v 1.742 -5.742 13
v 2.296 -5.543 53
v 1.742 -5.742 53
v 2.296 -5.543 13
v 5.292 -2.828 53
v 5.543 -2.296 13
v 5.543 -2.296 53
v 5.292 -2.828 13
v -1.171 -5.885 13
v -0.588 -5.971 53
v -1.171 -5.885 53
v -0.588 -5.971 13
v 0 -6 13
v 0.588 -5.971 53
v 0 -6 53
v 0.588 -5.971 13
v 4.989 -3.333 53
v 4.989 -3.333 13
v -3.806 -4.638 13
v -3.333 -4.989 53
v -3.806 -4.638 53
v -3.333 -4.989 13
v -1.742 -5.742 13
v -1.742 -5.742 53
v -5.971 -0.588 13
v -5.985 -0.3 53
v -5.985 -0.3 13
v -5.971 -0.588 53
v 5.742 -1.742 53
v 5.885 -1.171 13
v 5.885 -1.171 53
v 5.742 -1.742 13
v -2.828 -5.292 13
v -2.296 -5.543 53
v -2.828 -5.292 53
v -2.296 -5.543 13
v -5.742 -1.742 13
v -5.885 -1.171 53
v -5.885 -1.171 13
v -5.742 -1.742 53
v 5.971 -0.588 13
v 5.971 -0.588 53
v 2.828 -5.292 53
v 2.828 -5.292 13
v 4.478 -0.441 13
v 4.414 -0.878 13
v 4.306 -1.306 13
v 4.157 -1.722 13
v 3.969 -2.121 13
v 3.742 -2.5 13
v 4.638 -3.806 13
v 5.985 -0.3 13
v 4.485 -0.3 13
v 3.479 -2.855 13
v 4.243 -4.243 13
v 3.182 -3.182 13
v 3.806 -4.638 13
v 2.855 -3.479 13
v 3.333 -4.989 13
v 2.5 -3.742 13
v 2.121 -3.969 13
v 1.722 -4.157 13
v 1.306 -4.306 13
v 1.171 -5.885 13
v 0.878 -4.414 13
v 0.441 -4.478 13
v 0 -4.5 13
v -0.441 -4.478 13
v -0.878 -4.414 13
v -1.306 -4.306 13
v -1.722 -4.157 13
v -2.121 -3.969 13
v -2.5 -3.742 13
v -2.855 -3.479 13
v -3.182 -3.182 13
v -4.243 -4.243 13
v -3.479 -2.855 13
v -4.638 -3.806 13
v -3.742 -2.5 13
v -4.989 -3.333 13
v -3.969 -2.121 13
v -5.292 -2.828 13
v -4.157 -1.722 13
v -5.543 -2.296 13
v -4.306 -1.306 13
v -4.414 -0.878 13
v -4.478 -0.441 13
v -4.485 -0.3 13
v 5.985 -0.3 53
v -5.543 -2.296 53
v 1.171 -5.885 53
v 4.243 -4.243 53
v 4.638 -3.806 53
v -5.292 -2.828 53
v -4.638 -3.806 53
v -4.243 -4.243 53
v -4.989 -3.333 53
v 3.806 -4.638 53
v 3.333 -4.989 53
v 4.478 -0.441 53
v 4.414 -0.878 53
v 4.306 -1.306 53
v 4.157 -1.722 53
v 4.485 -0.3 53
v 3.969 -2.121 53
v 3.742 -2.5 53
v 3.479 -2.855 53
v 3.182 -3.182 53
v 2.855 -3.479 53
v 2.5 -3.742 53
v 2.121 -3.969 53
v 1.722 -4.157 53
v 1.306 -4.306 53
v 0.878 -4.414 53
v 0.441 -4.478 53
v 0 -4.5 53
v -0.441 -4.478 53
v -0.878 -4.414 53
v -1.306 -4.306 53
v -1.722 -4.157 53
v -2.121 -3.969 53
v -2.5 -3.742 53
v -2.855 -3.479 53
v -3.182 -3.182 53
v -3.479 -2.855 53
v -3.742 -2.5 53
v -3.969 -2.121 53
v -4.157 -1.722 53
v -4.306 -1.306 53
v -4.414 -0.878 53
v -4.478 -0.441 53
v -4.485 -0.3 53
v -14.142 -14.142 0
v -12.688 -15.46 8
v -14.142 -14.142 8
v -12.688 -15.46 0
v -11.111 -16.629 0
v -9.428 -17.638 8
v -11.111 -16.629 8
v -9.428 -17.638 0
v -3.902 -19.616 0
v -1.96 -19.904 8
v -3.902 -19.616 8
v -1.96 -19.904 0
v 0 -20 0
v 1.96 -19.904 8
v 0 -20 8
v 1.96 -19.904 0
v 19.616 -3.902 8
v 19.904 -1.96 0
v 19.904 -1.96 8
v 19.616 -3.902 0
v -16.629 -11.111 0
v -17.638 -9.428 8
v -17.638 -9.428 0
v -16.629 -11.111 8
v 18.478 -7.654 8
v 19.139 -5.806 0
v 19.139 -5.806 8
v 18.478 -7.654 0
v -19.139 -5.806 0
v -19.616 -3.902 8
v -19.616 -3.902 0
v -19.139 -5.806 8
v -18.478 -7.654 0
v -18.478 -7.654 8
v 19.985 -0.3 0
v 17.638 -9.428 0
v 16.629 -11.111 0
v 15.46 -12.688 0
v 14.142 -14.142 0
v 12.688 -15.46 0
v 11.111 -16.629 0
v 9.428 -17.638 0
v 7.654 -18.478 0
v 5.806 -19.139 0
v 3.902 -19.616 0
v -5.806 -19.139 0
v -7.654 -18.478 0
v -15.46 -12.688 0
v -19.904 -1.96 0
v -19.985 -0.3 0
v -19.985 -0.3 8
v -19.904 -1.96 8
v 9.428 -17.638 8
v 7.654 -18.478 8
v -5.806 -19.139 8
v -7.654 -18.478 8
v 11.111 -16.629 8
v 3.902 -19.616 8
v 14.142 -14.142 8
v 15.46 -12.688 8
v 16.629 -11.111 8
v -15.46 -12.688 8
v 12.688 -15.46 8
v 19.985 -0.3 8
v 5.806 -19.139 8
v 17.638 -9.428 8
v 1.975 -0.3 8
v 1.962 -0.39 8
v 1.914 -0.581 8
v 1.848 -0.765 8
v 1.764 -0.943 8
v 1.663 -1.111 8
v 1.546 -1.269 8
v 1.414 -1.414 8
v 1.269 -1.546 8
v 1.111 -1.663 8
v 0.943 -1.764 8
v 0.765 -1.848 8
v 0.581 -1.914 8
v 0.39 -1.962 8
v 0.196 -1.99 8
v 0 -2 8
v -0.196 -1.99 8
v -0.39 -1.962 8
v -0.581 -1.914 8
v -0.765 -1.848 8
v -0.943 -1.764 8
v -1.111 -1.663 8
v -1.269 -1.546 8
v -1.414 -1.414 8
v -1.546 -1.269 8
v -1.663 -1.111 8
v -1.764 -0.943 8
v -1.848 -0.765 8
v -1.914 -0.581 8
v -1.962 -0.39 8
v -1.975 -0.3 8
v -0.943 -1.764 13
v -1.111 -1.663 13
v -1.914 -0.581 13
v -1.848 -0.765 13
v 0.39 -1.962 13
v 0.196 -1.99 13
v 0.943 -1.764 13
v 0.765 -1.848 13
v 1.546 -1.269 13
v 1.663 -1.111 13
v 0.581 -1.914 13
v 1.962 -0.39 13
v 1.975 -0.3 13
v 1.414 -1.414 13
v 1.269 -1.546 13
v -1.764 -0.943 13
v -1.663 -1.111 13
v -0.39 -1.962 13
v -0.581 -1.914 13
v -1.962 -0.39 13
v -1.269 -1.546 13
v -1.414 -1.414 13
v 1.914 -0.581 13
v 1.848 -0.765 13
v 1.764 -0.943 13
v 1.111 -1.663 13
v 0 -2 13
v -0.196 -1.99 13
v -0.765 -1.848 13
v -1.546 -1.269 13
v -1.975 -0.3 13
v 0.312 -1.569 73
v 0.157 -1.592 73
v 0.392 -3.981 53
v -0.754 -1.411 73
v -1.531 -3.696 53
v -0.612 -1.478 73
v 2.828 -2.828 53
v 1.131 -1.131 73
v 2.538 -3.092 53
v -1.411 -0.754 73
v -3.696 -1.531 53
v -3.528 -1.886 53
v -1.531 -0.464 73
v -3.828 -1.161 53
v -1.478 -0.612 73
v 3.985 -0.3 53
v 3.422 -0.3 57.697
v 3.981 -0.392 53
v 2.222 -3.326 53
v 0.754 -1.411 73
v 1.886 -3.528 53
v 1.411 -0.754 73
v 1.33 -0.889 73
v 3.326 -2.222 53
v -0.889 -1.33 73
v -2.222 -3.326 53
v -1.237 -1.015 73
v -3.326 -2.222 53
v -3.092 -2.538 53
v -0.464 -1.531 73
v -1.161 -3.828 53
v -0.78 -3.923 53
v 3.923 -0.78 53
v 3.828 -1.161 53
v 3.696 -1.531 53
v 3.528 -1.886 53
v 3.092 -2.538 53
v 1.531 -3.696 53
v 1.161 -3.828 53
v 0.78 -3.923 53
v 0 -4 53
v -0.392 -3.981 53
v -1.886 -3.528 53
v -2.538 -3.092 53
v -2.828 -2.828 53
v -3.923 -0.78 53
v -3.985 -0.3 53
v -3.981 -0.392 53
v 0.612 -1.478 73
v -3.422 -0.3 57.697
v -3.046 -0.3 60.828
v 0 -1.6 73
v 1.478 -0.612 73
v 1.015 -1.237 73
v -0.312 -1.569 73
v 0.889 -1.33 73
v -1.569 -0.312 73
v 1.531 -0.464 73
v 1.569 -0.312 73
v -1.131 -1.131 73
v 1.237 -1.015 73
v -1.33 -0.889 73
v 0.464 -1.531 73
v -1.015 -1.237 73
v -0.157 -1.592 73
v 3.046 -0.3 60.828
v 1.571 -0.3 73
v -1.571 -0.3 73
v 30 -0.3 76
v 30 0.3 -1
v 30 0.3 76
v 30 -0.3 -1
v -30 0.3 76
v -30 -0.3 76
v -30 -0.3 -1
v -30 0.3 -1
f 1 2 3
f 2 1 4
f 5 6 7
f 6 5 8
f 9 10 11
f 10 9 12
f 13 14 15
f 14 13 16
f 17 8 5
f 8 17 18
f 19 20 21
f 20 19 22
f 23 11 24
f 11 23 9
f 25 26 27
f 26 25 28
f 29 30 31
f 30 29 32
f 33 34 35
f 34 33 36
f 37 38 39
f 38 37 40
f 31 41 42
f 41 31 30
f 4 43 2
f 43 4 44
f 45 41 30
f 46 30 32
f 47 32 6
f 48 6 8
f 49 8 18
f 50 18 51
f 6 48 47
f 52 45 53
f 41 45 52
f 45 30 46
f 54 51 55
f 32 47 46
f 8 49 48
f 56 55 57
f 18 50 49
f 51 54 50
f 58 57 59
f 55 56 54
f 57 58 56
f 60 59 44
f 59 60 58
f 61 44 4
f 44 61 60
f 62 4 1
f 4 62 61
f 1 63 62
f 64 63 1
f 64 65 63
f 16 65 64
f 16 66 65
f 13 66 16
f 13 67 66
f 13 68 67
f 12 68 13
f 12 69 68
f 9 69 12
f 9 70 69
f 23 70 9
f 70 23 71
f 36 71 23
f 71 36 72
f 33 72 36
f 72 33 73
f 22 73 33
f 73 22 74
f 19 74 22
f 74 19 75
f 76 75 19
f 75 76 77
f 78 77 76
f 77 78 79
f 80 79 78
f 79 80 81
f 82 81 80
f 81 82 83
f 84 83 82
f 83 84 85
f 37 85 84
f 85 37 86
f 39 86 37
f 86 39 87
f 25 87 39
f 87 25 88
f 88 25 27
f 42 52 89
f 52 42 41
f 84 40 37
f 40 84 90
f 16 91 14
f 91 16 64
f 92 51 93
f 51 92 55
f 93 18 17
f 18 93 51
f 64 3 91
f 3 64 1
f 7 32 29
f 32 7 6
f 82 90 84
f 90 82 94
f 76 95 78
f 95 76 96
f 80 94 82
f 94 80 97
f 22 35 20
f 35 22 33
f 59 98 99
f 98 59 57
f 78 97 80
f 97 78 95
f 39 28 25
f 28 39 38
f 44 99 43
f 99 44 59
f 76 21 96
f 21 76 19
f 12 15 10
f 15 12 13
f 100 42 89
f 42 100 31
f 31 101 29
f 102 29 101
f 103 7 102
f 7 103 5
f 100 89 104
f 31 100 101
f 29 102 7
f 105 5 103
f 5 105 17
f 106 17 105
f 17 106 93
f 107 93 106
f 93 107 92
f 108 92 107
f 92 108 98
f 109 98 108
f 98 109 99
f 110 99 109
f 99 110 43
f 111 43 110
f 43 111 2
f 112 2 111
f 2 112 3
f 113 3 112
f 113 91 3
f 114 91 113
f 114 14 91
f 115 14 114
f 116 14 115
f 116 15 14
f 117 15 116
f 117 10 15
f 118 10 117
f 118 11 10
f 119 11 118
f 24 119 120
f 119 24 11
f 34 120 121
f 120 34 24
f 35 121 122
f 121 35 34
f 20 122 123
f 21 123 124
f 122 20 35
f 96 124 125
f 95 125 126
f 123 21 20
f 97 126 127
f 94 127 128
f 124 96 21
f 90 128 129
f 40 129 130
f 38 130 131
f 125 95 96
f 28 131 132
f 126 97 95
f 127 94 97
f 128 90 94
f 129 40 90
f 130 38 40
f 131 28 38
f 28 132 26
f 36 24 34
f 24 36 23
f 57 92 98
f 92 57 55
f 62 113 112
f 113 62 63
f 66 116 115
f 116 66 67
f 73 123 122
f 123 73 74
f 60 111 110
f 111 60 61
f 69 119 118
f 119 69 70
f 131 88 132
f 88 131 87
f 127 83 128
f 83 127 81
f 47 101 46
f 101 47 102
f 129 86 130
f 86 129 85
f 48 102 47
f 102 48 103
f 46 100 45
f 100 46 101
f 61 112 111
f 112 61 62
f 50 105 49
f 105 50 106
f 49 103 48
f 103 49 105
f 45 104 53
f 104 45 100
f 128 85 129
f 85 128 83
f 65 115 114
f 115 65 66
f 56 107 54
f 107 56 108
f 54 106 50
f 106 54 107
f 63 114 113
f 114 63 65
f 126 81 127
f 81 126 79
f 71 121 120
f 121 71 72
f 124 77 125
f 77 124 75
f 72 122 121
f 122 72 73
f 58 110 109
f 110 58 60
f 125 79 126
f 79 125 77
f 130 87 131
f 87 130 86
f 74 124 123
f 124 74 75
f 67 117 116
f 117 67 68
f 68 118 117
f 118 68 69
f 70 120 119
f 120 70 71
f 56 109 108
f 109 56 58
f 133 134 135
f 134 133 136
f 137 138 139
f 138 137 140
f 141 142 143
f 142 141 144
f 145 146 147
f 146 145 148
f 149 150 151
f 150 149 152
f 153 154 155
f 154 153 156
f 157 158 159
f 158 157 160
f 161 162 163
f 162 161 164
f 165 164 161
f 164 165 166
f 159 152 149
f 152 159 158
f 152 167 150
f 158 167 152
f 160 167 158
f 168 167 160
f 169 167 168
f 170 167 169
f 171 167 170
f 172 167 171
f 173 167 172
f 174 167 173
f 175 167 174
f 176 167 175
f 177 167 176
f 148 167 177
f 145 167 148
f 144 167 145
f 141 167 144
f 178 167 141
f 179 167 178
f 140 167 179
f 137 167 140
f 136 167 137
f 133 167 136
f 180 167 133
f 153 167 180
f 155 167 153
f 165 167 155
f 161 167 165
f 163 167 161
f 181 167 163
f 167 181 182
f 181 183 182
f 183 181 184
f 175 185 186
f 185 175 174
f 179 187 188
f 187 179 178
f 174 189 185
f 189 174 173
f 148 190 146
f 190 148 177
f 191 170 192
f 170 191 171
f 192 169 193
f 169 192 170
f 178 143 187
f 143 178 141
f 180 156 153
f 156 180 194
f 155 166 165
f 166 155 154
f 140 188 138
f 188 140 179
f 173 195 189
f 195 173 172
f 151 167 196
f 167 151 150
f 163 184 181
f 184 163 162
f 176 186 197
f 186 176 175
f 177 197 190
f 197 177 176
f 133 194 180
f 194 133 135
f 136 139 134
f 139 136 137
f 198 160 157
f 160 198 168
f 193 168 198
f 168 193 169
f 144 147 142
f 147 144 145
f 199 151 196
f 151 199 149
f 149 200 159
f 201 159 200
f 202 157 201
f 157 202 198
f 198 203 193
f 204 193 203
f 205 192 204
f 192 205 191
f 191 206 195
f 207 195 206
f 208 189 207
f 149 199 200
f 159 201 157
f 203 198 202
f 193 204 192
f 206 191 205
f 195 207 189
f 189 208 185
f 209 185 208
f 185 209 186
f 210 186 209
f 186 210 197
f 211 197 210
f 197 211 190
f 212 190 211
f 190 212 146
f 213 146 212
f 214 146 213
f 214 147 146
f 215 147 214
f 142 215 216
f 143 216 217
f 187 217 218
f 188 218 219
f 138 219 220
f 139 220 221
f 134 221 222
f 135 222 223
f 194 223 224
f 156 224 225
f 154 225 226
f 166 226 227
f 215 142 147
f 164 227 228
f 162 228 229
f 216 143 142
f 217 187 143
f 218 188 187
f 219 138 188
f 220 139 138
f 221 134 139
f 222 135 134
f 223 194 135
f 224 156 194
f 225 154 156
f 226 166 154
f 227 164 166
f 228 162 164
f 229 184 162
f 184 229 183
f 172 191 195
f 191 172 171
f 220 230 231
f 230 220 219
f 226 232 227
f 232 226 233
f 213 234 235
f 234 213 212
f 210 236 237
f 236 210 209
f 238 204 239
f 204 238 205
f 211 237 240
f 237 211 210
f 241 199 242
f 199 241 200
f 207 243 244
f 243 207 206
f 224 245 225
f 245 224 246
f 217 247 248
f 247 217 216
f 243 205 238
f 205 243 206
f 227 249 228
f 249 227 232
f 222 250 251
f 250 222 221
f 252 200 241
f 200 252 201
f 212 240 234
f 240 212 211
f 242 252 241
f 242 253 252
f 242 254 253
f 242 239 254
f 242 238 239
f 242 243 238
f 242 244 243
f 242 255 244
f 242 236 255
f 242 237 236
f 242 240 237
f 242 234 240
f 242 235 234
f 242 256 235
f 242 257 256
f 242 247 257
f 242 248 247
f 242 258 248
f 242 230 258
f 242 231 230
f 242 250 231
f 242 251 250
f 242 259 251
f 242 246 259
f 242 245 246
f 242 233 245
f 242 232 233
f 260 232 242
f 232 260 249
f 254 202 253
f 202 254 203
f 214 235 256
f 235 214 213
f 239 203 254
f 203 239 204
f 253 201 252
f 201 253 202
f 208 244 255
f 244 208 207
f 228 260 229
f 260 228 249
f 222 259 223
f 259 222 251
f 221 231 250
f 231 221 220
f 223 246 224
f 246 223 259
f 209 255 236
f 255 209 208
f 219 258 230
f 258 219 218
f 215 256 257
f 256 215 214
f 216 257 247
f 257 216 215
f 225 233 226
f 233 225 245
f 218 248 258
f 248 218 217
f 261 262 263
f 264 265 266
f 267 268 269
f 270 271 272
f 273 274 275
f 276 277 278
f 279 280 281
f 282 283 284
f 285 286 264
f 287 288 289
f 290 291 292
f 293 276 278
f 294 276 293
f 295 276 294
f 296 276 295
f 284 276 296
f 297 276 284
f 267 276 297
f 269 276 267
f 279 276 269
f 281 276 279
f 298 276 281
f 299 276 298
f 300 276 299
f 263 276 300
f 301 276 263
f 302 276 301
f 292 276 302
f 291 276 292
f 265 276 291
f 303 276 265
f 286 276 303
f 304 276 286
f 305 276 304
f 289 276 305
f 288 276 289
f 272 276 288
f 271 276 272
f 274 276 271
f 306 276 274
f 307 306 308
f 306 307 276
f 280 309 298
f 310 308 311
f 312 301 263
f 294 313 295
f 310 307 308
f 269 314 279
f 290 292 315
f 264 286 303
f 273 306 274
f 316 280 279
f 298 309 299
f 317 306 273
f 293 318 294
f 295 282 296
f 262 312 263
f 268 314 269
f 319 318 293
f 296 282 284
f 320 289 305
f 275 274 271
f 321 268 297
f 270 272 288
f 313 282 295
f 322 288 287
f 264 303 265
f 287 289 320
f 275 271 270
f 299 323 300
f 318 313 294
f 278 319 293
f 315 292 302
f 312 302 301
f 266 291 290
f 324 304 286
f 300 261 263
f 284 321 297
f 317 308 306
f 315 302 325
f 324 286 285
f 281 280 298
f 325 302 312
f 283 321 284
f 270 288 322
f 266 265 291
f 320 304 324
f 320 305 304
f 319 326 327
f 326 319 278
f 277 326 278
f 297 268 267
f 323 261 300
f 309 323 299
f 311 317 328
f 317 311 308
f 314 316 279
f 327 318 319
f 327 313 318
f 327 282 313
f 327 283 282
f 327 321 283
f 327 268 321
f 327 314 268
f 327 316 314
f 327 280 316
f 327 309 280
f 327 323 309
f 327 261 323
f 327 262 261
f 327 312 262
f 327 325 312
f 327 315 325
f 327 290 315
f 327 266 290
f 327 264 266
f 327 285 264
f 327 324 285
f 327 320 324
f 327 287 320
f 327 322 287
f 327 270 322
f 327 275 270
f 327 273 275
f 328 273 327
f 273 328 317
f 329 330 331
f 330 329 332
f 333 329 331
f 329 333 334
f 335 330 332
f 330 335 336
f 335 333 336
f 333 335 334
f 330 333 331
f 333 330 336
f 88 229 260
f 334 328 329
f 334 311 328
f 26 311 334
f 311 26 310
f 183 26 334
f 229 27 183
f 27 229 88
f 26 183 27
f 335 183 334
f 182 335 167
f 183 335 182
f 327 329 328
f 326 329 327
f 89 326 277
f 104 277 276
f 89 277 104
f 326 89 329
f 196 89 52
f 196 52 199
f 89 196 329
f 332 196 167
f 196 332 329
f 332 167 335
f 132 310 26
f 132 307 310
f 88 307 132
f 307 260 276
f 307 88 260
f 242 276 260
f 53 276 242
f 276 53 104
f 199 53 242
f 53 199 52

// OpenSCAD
// 결합도 (Assembly View)
// 단면 컷(half-section)으로 내부 조립 상태를 동시에 보여준다

$fn = 64;

BASE_COLOR  = [0.85, 0.85, 0.85];
MID_COLOR   = [0.60, 0.80, 1.00];
TOP_COLOR   = [1.00, 0.75, 0.30];

BASE_R  = 20;  BASE_H  = 8;
MID_R   = 6;   MID_H   = 40;
TOP_R   = 4;   TOP_H   = 20;
FEED_R  = 2;   FEED_H  = 5;

TOTAL_H = BASE_H + FEED_H + MID_H + TOP_H + 2;
CUT_W   = 60;  // 단면 컷 절반 폭

// 전체 조립 모델 (절반 단면 컷 적용)
module full_assembly() {
    // 기저 플레이트
    color(BASE_COLOR)
        cylinder(r=BASE_R, h=BASE_H);

    // 피드 핀
    color([0.3, 0.3, 0.3])
        translate([0, 0, BASE_H])
            cylinder(r=FEED_R, h=FEED_H);

    // 중간 슬리브
    color(MID_COLOR)
        translate([0, 0, BASE_H + FEED_H])
            difference() {
                cylinder(r=MID_R,     h=MID_H);
                cylinder(r=MID_R-1.5, h=MID_H);
            }

    // 상단 방사 소자
    color(TOP_COLOR)
        translate([0, 0, BASE_H + FEED_H + MID_H])
            cylinder(r1=TOP_R, r2=TOP_R*0.4, h=TOP_H);
}

// 단면 컷: +Y 반쪽만 제거해 내부 단면 노출
difference() {
    full_assembly();
    // Y 양수 방향 절반 제거
    translate([-CUT_W/2, 0, -1])
        cube([CUT_W, CUT_W, TOTAL_H + 2]);
}

// 단면 윤곽선 강조 (얇은 회색 면)
color([0.5, 0.5, 0.5, 0.3])
    translate([-CUT_W/2, -0.3, -1])
        cube([CUT_W, 0.6, TOTAL_H + 2]);
